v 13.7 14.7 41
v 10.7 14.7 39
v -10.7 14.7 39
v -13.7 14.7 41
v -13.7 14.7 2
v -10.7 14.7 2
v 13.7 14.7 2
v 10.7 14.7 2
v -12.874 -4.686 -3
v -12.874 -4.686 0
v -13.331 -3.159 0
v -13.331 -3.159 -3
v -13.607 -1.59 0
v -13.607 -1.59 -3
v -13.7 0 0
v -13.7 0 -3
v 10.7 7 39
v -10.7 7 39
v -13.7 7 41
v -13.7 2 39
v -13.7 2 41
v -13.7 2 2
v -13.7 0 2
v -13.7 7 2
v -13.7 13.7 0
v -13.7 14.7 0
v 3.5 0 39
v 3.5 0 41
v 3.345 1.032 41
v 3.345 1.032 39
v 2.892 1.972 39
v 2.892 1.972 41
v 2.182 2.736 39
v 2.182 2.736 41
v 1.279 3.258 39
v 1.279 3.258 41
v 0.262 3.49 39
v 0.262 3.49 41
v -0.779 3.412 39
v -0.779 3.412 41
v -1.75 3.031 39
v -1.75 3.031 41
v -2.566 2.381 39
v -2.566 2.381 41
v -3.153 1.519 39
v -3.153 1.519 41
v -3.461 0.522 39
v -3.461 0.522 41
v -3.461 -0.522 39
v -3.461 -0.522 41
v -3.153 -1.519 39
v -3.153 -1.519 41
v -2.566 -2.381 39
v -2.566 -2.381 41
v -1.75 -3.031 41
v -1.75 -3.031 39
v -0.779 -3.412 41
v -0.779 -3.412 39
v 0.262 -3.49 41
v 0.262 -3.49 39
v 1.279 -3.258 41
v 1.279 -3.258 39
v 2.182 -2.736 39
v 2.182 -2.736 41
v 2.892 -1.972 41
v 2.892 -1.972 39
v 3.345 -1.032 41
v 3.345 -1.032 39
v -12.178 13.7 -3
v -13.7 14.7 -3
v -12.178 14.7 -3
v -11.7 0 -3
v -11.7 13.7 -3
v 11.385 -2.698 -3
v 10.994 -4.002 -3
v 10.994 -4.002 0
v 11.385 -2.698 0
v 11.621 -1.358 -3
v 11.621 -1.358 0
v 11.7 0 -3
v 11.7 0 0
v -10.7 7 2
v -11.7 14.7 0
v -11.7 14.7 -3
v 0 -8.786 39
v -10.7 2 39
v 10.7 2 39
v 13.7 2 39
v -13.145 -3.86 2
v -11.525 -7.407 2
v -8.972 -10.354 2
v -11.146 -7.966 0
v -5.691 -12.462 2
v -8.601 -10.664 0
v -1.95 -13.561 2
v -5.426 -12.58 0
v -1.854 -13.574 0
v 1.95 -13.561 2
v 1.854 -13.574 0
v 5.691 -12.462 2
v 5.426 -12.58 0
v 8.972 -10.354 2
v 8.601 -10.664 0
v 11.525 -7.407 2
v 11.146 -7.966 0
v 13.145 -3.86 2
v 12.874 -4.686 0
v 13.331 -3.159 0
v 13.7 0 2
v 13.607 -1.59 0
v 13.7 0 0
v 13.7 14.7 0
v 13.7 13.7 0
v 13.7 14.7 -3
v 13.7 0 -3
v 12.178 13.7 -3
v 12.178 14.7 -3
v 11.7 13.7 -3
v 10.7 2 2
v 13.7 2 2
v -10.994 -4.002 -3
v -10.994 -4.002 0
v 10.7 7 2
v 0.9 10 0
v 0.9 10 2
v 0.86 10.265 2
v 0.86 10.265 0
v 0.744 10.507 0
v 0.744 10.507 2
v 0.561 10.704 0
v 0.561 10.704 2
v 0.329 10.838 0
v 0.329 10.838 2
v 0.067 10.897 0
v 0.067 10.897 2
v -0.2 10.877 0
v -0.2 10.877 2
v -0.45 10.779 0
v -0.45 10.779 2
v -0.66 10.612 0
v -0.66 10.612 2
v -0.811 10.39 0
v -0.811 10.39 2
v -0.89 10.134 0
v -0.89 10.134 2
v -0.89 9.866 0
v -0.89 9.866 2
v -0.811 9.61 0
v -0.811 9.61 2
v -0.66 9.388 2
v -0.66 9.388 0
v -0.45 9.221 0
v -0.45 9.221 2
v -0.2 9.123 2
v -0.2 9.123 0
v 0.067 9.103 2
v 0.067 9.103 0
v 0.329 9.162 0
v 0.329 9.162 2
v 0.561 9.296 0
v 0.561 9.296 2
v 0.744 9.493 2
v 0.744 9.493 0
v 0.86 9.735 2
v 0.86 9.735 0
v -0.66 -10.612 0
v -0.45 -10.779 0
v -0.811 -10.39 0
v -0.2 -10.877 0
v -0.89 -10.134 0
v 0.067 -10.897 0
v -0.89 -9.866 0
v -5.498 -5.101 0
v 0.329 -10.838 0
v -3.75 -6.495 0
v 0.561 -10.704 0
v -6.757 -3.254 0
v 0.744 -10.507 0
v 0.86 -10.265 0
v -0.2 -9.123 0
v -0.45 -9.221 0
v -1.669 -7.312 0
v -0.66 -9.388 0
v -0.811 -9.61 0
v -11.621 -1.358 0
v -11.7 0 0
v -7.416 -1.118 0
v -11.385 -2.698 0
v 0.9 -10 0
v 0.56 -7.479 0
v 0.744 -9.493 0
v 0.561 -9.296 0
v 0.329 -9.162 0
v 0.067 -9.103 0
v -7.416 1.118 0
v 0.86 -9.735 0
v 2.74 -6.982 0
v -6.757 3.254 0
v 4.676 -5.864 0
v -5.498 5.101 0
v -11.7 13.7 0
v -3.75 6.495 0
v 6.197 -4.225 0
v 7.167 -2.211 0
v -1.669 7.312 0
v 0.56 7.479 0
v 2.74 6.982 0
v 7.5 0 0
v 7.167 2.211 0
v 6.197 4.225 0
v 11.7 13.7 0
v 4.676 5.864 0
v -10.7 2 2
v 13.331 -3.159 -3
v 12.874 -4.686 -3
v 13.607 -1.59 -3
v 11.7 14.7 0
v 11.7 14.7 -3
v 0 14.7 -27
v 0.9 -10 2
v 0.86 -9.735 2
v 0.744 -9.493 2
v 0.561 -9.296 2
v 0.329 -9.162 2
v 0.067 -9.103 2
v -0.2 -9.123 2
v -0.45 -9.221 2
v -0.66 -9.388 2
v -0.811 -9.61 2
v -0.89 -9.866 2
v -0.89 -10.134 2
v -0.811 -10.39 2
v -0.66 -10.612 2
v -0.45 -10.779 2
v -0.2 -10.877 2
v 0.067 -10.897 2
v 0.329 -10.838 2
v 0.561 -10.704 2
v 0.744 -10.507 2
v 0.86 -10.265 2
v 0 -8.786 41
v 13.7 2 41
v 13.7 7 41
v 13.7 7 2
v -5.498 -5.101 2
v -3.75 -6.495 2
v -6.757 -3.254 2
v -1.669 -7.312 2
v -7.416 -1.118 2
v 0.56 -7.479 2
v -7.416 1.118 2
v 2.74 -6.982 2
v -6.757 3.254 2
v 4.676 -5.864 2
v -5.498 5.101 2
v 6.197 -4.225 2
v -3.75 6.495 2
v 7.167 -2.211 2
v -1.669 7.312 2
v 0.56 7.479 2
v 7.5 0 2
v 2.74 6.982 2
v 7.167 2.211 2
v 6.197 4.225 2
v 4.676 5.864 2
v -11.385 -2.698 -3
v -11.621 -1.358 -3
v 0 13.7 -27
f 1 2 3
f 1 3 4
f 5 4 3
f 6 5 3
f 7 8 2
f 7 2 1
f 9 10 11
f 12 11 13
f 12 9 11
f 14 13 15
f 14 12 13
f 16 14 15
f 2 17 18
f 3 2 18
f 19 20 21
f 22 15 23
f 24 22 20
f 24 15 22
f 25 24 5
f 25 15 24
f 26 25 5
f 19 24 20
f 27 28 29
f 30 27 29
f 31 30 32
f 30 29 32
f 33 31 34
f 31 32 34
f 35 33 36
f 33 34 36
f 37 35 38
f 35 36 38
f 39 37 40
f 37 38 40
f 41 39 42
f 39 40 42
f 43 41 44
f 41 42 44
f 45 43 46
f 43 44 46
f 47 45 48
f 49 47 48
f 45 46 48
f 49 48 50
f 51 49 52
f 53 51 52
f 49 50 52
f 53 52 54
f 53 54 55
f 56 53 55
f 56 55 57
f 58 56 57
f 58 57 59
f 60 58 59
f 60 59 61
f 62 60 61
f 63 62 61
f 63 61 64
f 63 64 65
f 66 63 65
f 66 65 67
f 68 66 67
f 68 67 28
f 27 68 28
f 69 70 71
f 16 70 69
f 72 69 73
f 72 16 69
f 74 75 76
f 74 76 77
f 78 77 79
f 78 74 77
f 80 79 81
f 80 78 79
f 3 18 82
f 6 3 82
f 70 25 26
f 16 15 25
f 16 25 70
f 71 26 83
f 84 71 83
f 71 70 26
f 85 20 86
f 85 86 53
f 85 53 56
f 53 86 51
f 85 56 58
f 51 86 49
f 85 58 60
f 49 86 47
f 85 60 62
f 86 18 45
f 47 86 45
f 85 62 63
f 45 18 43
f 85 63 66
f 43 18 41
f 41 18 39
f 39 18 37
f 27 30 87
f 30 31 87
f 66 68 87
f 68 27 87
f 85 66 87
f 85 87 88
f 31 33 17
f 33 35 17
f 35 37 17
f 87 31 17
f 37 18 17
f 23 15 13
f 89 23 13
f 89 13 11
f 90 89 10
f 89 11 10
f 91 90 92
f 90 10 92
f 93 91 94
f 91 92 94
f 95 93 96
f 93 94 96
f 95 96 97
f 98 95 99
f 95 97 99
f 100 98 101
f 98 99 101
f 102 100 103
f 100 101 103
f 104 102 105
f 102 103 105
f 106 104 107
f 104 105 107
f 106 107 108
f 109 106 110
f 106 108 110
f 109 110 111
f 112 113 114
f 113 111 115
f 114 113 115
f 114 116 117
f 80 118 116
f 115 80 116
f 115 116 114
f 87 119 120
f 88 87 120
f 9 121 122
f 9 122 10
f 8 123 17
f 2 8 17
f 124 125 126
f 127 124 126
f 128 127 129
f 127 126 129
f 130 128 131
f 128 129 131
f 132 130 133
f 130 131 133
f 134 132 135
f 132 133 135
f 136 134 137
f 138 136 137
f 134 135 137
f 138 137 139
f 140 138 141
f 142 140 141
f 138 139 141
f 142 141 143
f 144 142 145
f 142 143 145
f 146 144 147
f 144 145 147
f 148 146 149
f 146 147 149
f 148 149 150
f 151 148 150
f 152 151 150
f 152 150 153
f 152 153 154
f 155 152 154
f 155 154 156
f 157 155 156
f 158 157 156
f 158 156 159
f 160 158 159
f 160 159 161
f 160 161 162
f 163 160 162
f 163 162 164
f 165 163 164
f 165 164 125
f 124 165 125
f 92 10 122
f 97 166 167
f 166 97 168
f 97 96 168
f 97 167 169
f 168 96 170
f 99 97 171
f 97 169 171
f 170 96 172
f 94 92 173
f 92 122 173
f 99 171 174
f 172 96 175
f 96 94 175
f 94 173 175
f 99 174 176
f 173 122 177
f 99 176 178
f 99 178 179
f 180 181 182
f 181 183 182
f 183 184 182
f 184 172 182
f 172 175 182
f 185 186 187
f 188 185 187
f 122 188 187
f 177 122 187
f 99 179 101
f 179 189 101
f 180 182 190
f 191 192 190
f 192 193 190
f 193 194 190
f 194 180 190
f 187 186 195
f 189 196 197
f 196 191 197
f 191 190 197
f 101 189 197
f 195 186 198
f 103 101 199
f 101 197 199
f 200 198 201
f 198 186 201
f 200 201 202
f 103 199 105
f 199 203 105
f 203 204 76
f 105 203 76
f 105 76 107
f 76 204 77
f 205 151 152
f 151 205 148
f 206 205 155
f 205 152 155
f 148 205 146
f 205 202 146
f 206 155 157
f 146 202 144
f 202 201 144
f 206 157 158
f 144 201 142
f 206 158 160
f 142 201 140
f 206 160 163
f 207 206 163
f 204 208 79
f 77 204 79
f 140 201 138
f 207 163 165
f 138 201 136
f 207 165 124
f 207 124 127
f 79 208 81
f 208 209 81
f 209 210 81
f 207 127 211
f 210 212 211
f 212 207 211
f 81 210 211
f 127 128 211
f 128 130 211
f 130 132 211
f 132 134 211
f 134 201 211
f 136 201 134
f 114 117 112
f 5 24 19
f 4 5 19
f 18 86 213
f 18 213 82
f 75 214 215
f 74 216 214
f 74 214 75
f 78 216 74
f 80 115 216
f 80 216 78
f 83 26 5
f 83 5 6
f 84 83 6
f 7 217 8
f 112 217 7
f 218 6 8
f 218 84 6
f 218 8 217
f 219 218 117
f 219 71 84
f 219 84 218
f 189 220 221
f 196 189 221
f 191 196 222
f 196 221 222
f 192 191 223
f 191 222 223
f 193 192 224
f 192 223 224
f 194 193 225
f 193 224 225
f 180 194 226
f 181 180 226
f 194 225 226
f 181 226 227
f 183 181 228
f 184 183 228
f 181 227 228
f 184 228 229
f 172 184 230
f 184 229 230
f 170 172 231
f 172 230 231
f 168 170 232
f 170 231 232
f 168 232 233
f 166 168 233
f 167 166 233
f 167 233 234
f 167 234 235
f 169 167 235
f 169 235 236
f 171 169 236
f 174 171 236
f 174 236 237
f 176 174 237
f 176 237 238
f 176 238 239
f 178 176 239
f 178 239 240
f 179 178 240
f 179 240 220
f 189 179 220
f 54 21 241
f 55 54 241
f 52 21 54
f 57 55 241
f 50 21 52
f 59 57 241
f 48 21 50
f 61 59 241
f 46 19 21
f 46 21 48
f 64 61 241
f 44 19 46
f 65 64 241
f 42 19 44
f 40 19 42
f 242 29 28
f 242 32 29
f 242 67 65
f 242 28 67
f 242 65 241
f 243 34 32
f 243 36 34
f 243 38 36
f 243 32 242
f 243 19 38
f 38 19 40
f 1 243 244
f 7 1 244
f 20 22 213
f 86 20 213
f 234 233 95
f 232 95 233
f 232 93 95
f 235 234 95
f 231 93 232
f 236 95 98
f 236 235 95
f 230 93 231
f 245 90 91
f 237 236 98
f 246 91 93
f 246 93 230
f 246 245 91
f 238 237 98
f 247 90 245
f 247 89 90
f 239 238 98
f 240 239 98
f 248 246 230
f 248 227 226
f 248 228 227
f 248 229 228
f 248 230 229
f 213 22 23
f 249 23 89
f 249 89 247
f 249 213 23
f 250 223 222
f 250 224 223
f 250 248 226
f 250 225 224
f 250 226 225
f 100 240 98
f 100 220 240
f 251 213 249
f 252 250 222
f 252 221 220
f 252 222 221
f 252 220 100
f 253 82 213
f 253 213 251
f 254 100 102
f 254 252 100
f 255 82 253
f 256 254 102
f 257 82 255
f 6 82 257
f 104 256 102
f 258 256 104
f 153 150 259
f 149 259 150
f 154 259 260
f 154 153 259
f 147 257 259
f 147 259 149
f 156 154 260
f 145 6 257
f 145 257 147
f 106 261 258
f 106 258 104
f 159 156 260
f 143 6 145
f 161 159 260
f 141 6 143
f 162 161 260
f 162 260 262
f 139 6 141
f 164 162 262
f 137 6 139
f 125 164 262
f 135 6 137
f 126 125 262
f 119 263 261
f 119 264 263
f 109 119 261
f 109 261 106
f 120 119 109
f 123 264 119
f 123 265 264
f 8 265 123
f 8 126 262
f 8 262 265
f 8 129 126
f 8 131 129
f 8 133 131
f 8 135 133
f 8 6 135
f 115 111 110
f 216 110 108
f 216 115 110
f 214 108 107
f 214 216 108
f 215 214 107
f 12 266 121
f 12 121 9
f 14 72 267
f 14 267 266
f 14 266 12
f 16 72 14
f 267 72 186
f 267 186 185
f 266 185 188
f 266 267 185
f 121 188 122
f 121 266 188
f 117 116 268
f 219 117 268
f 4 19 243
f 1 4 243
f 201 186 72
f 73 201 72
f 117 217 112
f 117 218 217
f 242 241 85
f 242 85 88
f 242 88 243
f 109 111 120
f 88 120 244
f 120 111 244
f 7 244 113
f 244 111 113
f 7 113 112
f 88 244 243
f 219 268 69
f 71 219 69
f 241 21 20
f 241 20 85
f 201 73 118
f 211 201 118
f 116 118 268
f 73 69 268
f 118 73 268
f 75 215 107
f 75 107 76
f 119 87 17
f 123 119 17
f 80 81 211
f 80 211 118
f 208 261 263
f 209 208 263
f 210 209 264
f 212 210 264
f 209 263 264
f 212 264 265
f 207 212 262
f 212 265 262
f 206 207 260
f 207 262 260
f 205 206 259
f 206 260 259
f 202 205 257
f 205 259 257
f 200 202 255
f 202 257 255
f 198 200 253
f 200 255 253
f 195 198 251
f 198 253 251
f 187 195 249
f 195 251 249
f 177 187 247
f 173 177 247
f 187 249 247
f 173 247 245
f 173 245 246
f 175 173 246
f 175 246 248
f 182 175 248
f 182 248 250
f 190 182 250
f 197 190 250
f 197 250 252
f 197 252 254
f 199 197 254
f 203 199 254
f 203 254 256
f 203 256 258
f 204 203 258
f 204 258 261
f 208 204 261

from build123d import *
from build123d.topology import SkipClean

# Parameters (mm, degrees)
BOSS_EXTRUDE1_DEPTH = 2
BOSS_EXTRUDE2_START = 3
BOSS_EXTRUDE2_DEPTH = 3
CUT_EXTRUDE1_REACH  = 22.009
SKETCH5_R           = 7.5
BOSS_EXTRUDE3_DEPTH = 1
SKETCH8_W           = 3
SKETCH8_H           = 5
BOSS_EXTRUDE4_DEPTH = 39
BOSS_EXTRUDE5_DEPTH = 2
CUT_EXTRUDE2_REACH  = 72.907
SKETCH10_R          = 3.5
CUT_EXTRUDE4_REACH  = 45.872
SKETCH11_R          = 0.9
BOSS_EXTRUDE6_DEPTH = 7.7
SKETCH16_W          = 2
SKETCH16_H          = 3
BOSS_EXTRUDE7_DEPTH = 14.7


with BuildPart() as part:
    # Sketch2 → Boss-Extrude1 (new body)
    with BuildSketch(Plane.XY):
        with BuildLine():
            ThreePointArc((13.7, 0), (9.687362902, 9.687362902), (0, 13.7))
            ThreePointArc((0, 13.7), (-9.687362902, 9.687362902), (-13.7, 0))
            Line((-13.7, 0), (13.7, 0))
        make_face()
        with BuildLine():
            Line((13.7, 0), (-13.7, 0))
            ThreePointArc((-13.7, 0), (0, -13.7), (13.7, 0))
        make_face()
        with BuildLine():
            Line((13.7, 13.7), (0, 13.7))
            ThreePointArc((0, 13.7), (9.687362902, 9.687362902), (13.7, 0))
            Line((13.7, 0), (13.7, 13.7))
        make_face()
        with BuildLine():
            Line((0, 13.7), (-13.7, 13.7))
            Line((-13.7, 13.7), (-13.7, 0))
            ThreePointArc((-13.7, 0), (-9.687362902, 9.687362902), (0, 13.7))
        make_face()
        with BuildLine():
            ThreePointArc((13.7, 0), (9.687362902, 9.687362902), (0, 13.7))
            ThreePointArc((0, 13.7), (-9.687362902, 9.687362902), (-13.7, 0))
            Line((-13.7, 0), (13.7, 0))
        make_face()
        with BuildLine():
            Line((13.7, 0), (-13.7, 0))
            ThreePointArc((-13.7, 0), (0, -13.7), (13.7, 0))
        make_face()
    extrude(amount=BOSS_EXTRUDE1_DEPTH)

    # Sketch3 → Boss-Extrude2 (add)
    with SkipClean():  # the faces are left unmerged after this step: merging them gives an invalid solid
        with BuildSketch(Plane(origin=(0, 0, 0), x_dir=(-1, 0, 0), z_dir=(0, 0, -1)).offset(BOSS_EXTRUDE2_START)):
            with BuildLine():
                Line((-11.7, 0), (-13.7, 0))
                ThreePointArc((-13.7, 0), (-13.491866216, -2.378980034), (-12.873788905, -4.685675964))
                Line((-12.873788905, -4.685675964), (-10.994403663, -4.001635677))
                ThreePointArc((-10.994403663, -4.001635677), (-11.52225071, -2.031683679), (-11.7, 0))
            make_face()
            with BuildLine():
                ThreePointArc((11.7, 0), (11.52225071, -2.031683679), (10.994403663, -4.001635677))
                Line((10.994403663, -4.001635677), (12.873788905, -4.685675964))
                ThreePointArc((12.873788905, -4.685675964), (13.491866216, -2.378980034), (13.7, 0))
                Line((13.7, 0), (11.7, 0))
            make_face()
        extrude(amount=-BOSS_EXTRUDE2_DEPTH)

    # Sketch5 → Cut-Extrude1 (cut, up to next)
    with BuildSketch(Plane.XY.offset(2), mode=Mode.PRIVATE) as cut_extrude1_sk1:
        Circle(SKETCH5_R)
    cut_extrude1_tool1 = extrude(cut_extrude1_sk1.sketch, amount=-CUT_EXTRUDE1_REACH, mode=Mode.PRIVATE) & part.part
    add(cut_extrude1_tool1.solids().sort_by_distance((0, 0, 2))[0], mode=Mode.SUBTRACT)

    # Sketch7 → Boss-Extrude3 (add)
    with SkipClean():  # the faces are left unmerged after this step: merging them gives an invalid solid
        with BuildSketch(Plane(origin=(0, 13.7, 0), x_dir=(1, 0, 0), z_dir=(0, 1, 0))):
            Polygon((0, 0), (13.7, 0), (0, 27), (-13.7, 0), align=None)
            Polygon((13.7, -2), (13.7, 0), (0, 0), (-13.7, 0), (-13.7, -2), align=None)
        extrude(amount=BOSS_EXTRUDE3_DEPTH)

    # Sketch8 → Boss-Extrude4 (add)
    with SkipClean():  # the faces are left unmerged after this step: merging them gives an invalid solid
        with BuildSketch(Plane.XY.offset(2)):
            with Locations((-12.2, 4.5)):
                Rectangle(SKETCH8_W, SKETCH8_H)
            with Locations((12.2, 4.5)):
                Rectangle(SKETCH8_W, SKETCH8_H)
        extrude(amount=BOSS_EXTRUDE4_DEPTH)

    # Sketch9 → Boss-Extrude5 (add)
    with SkipClean():  # the faces are left unmerged after this step: merging them gives an invalid solid
        with BuildSketch(Plane.XY.offset(41)):
            Polygon((-10.7, 2), (-13.7, 2), (0, -8.786353055), (13.7, 2), (10.7, 2), (10.7, 7), (-10.7, 7), align=None)
        extrude(amount=-BOSS_EXTRUDE5_DEPTH)

    # Sketch10 → Cut-Extrude2 (cut, up to next)
    with BuildSketch(Plane.XY.offset(41), mode=Mode.PRIVATE) as cut_extrude2_sk1:
        Circle(SKETCH10_R)
    cut_extrude2_tool1 = extrude(cut_extrude2_sk1.sketch, amount=-CUT_EXTRUDE2_REACH, mode=Mode.PRIVATE) & part.part
    add(cut_extrude2_tool1.solids().sort_by_distance((0, 0, 41))[0], mode=Mode.SUBTRACT)

    # Sketch11 → Cut-Extrude4 (cut, up to next)
    with BuildSketch(Plane.XY.offset(2), mode=Mode.PRIVATE) as cut_extrude4_sk1:
        with Locations((0, 10)):
            Circle(SKETCH11_R)
    cut_extrude4_tool1 = extrude(cut_extrude4_sk1.sketch, amount=-CUT_EXTRUDE4_REACH, mode=Mode.PRIVATE) & part.part
    # Sketch11 → Cut-Extrude4 (cut, up to next)
    with BuildSketch(Plane.XY.offset(2), mode=Mode.PRIVATE) as cut_extrude4_sk2:
        with Locations((0, -10)):
            Circle(SKETCH11_R)
    cut_extrude4_tool2 = extrude(cut_extrude4_sk2.sketch, amount=-CUT_EXTRUDE4_REACH, mode=Mode.PRIVATE) & part.part
    add(cut_extrude4_tool1.solids().sort_by_distance((0, 10, 2))[0], mode=Mode.SUBTRACT)
    add(cut_extrude4_tool2.solids().sort_by_distance((0, -10, 2))[0], mode=Mode.SUBTRACT)

    # Sketch15 → Boss-Extrude6 (add, through all)
    with SkipClean():  # the faces are left unmerged after this step: merging them gives an invalid solid
        with BuildSketch(Plane(origin=(0, 7, 0), x_dir=(1, 0, 0), z_dir=(0, 1, 0))):
            Polygon((-10.7, -2), (-13.7, -2), (-13.7, -41), (13.7, -41), (13.7, -2), (10.7, -2), (10.7, -39), (-10.7, -39), align=None)
        extrude(amount=BOSS_EXTRUDE6_DEPTH)

    # Sketch16 → Boss-Extrude7 (add, through all)
    with SkipClean():  # the faces are left unmerged after this step: merging them gives an invalid solid
        with BuildSketch(Plane(origin=(0, 0, 0), x_dir=(1, 0, 0), z_dir=(0, 1, 0))):
            with Locations((12.7, 1.5)):
                Rectangle(SKETCH16_W, SKETCH16_H)
            with Locations((-12.7, 1.5)):
                Rectangle(SKETCH16_W, SKETCH16_H)
        extrude(amount=BOSS_EXTRUDE7_DEPTH)


solid = part.part
